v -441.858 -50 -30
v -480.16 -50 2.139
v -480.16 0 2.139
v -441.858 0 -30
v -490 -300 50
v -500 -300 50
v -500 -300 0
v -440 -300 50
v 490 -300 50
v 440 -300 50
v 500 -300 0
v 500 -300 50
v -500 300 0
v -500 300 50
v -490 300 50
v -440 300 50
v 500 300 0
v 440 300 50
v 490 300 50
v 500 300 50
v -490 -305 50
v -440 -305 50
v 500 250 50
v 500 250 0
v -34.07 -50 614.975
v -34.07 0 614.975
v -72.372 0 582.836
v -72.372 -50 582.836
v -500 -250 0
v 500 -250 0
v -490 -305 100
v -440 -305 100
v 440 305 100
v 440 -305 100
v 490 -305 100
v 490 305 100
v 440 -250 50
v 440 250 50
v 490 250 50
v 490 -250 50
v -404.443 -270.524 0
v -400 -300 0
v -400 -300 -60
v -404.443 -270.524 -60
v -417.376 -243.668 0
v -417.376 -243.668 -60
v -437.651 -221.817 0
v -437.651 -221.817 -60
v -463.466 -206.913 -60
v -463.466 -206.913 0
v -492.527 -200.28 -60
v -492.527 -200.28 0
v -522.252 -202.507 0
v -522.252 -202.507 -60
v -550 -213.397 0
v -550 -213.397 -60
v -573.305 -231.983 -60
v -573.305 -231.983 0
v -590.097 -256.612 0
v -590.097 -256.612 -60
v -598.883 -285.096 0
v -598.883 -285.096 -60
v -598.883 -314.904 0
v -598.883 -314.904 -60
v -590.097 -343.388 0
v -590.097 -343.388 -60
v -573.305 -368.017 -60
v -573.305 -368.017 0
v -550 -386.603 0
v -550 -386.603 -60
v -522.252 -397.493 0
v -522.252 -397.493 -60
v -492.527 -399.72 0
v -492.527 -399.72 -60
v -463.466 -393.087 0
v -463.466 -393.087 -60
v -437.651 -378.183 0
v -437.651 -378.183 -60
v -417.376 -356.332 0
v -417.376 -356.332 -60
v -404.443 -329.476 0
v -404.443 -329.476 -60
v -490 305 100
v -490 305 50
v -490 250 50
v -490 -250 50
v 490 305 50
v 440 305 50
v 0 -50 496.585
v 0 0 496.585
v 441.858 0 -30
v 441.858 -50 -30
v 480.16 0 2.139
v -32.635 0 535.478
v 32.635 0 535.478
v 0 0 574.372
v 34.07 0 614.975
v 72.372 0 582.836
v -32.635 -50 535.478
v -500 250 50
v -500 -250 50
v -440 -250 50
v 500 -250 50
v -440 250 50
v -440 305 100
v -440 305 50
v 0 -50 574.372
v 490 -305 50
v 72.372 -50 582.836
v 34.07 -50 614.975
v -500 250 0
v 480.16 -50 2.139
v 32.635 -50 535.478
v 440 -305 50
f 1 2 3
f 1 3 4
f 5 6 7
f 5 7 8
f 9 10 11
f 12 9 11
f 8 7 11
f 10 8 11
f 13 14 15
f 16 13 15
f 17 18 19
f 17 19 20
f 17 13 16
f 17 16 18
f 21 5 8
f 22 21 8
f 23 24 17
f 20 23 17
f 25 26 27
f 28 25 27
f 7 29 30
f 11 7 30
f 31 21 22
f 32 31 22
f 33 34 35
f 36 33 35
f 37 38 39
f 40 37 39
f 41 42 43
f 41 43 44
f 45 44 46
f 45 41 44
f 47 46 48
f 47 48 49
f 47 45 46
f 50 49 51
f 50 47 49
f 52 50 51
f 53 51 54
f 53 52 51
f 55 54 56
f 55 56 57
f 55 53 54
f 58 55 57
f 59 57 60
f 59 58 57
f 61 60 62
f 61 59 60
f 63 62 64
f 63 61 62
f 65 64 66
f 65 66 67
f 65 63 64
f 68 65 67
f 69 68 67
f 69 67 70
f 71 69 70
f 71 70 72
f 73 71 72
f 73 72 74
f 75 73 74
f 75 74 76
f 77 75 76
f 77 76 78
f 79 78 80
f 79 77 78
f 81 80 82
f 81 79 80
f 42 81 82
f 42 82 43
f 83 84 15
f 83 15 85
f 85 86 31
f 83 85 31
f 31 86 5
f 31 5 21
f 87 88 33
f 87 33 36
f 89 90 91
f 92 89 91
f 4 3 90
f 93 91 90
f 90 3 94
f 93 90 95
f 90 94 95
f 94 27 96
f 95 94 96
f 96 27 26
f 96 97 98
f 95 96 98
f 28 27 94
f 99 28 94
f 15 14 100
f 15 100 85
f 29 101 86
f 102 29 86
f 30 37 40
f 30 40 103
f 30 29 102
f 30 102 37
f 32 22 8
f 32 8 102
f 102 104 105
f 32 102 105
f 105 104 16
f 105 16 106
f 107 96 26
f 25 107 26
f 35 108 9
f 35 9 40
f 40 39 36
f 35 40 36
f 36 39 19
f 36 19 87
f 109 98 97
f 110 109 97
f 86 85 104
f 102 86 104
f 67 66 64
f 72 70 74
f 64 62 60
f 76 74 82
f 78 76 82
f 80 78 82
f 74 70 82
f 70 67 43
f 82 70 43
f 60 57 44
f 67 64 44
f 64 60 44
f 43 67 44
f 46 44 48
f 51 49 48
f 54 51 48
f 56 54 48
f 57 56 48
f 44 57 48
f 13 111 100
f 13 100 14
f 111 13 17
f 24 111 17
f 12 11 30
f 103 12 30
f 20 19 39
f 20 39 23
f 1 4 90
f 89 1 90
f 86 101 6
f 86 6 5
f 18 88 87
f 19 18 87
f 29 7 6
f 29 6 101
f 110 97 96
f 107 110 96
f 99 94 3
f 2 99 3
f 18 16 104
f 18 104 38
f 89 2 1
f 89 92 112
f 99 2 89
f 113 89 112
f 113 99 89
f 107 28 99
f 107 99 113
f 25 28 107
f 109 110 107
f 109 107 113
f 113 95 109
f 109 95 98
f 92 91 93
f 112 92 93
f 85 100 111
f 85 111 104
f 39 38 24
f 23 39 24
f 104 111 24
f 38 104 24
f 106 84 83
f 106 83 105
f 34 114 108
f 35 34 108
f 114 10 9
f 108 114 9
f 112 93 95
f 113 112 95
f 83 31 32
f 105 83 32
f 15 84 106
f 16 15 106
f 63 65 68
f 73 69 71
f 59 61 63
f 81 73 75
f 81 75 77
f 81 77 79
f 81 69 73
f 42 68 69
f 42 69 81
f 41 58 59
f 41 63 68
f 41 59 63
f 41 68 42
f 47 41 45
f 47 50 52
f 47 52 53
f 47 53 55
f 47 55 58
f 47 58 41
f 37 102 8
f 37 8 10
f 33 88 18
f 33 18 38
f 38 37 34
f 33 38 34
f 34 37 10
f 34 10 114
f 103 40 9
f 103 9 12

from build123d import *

# Parameters (mm, degrees)
F0_W     = 1000
F0_H     = 50
F1_DEPTH = 50
F2_W     = 50
F2_H     = 555
F2_H_2   = 50
F2_H_3   = 5
F3_DEPTH = 50
F5_DEPTH = 50
F6_R     = 100
F7_DEPTH = 60


with BuildPart() as f1:
    # F0 (on Top) → F1 (new body)
    with BuildSketch(Plane.XY):
        with Locations((0, 275)):
            Rectangle(F0_W, F0_H)
    extrude(amount=F1_DEPTH)



with BuildPart() as f1b:
    # F0 (on Top) → F1, piece 2 (new body)
    with BuildSketch(Plane.XY):
        with Locations((0, -275)):
            Rectangle(F0_W, F0_H)
    extrude(amount=F1_DEPTH)


with BuildPart() as f1_1:
    add(f1.part)

    add(f1b.part)  # F3 merges F1b
    # F2 (on face) → F3 (join)
    with BuildSketch(Plane.XY.offset(50)):
        with Locations((-465, -27.5)):
            Rectangle(F2_W, F2_H)
        with Locations((465, -27.5)):
            Rectangle(F2_W, F2_H)
        with Locations((-465, 275)):
            Rectangle(F2_W, F2_H_2)
        with Locations((465, 275)):
            Rectangle(F2_W, F2_H_2)
        with Locations((-465, 302.5)):
            Rectangle(F2_W, F2_H_3)
        with Locations((465, 302.5)):
            Rectangle(F2_W, F2_H_3)
    extrude(amount=F3_DEPTH)


with BuildPart() as f5:
    # F4 (on Front) → F5 (new body)
    with BuildSketch(Plane.XZ):
        Polygon((72.3724817217, 582.8355544952), (34.0702595657, 614.9749349795), (0, 574.3715807415), (32.6351822333, 535.4784850699), align=None)
        Polygon((-32.6351822333, 535.4784850699), (0, 574.3715807415), (-34.0702595657, 614.9749349795), (-72.3724817217, 582.8355544952), align=None)
        Polygon((32.6351822333, 535.4784850699), (0, 574.3715807415), (-32.6351822333, 535.4784850699), (0, 496.5853893984), align=None)
        Polygon((0, 496.5853893984), (-32.6351822333, 535.4784850699), (-480.1598281835, 2.1393804843), (-441.8576060276, -30), align=None)
        Polygon((480.1598281835, 2.1393804843), (32.6351822333, 535.4784850699), (0, 496.5853893984), (441.8576060276, -30), align=None)
    extrude(amount=F5_DEPTH)


with BuildPart() as f7:
    # F6 (on Top) → F7 (new body)
    with BuildSketch(Plane.XY):
        with Locations((-500, -300)):
            Circle(F6_R)
    extrude(amount=-F7_DEPTH)


solid = Compound([f1_1.part, f5.part, f7.part])
